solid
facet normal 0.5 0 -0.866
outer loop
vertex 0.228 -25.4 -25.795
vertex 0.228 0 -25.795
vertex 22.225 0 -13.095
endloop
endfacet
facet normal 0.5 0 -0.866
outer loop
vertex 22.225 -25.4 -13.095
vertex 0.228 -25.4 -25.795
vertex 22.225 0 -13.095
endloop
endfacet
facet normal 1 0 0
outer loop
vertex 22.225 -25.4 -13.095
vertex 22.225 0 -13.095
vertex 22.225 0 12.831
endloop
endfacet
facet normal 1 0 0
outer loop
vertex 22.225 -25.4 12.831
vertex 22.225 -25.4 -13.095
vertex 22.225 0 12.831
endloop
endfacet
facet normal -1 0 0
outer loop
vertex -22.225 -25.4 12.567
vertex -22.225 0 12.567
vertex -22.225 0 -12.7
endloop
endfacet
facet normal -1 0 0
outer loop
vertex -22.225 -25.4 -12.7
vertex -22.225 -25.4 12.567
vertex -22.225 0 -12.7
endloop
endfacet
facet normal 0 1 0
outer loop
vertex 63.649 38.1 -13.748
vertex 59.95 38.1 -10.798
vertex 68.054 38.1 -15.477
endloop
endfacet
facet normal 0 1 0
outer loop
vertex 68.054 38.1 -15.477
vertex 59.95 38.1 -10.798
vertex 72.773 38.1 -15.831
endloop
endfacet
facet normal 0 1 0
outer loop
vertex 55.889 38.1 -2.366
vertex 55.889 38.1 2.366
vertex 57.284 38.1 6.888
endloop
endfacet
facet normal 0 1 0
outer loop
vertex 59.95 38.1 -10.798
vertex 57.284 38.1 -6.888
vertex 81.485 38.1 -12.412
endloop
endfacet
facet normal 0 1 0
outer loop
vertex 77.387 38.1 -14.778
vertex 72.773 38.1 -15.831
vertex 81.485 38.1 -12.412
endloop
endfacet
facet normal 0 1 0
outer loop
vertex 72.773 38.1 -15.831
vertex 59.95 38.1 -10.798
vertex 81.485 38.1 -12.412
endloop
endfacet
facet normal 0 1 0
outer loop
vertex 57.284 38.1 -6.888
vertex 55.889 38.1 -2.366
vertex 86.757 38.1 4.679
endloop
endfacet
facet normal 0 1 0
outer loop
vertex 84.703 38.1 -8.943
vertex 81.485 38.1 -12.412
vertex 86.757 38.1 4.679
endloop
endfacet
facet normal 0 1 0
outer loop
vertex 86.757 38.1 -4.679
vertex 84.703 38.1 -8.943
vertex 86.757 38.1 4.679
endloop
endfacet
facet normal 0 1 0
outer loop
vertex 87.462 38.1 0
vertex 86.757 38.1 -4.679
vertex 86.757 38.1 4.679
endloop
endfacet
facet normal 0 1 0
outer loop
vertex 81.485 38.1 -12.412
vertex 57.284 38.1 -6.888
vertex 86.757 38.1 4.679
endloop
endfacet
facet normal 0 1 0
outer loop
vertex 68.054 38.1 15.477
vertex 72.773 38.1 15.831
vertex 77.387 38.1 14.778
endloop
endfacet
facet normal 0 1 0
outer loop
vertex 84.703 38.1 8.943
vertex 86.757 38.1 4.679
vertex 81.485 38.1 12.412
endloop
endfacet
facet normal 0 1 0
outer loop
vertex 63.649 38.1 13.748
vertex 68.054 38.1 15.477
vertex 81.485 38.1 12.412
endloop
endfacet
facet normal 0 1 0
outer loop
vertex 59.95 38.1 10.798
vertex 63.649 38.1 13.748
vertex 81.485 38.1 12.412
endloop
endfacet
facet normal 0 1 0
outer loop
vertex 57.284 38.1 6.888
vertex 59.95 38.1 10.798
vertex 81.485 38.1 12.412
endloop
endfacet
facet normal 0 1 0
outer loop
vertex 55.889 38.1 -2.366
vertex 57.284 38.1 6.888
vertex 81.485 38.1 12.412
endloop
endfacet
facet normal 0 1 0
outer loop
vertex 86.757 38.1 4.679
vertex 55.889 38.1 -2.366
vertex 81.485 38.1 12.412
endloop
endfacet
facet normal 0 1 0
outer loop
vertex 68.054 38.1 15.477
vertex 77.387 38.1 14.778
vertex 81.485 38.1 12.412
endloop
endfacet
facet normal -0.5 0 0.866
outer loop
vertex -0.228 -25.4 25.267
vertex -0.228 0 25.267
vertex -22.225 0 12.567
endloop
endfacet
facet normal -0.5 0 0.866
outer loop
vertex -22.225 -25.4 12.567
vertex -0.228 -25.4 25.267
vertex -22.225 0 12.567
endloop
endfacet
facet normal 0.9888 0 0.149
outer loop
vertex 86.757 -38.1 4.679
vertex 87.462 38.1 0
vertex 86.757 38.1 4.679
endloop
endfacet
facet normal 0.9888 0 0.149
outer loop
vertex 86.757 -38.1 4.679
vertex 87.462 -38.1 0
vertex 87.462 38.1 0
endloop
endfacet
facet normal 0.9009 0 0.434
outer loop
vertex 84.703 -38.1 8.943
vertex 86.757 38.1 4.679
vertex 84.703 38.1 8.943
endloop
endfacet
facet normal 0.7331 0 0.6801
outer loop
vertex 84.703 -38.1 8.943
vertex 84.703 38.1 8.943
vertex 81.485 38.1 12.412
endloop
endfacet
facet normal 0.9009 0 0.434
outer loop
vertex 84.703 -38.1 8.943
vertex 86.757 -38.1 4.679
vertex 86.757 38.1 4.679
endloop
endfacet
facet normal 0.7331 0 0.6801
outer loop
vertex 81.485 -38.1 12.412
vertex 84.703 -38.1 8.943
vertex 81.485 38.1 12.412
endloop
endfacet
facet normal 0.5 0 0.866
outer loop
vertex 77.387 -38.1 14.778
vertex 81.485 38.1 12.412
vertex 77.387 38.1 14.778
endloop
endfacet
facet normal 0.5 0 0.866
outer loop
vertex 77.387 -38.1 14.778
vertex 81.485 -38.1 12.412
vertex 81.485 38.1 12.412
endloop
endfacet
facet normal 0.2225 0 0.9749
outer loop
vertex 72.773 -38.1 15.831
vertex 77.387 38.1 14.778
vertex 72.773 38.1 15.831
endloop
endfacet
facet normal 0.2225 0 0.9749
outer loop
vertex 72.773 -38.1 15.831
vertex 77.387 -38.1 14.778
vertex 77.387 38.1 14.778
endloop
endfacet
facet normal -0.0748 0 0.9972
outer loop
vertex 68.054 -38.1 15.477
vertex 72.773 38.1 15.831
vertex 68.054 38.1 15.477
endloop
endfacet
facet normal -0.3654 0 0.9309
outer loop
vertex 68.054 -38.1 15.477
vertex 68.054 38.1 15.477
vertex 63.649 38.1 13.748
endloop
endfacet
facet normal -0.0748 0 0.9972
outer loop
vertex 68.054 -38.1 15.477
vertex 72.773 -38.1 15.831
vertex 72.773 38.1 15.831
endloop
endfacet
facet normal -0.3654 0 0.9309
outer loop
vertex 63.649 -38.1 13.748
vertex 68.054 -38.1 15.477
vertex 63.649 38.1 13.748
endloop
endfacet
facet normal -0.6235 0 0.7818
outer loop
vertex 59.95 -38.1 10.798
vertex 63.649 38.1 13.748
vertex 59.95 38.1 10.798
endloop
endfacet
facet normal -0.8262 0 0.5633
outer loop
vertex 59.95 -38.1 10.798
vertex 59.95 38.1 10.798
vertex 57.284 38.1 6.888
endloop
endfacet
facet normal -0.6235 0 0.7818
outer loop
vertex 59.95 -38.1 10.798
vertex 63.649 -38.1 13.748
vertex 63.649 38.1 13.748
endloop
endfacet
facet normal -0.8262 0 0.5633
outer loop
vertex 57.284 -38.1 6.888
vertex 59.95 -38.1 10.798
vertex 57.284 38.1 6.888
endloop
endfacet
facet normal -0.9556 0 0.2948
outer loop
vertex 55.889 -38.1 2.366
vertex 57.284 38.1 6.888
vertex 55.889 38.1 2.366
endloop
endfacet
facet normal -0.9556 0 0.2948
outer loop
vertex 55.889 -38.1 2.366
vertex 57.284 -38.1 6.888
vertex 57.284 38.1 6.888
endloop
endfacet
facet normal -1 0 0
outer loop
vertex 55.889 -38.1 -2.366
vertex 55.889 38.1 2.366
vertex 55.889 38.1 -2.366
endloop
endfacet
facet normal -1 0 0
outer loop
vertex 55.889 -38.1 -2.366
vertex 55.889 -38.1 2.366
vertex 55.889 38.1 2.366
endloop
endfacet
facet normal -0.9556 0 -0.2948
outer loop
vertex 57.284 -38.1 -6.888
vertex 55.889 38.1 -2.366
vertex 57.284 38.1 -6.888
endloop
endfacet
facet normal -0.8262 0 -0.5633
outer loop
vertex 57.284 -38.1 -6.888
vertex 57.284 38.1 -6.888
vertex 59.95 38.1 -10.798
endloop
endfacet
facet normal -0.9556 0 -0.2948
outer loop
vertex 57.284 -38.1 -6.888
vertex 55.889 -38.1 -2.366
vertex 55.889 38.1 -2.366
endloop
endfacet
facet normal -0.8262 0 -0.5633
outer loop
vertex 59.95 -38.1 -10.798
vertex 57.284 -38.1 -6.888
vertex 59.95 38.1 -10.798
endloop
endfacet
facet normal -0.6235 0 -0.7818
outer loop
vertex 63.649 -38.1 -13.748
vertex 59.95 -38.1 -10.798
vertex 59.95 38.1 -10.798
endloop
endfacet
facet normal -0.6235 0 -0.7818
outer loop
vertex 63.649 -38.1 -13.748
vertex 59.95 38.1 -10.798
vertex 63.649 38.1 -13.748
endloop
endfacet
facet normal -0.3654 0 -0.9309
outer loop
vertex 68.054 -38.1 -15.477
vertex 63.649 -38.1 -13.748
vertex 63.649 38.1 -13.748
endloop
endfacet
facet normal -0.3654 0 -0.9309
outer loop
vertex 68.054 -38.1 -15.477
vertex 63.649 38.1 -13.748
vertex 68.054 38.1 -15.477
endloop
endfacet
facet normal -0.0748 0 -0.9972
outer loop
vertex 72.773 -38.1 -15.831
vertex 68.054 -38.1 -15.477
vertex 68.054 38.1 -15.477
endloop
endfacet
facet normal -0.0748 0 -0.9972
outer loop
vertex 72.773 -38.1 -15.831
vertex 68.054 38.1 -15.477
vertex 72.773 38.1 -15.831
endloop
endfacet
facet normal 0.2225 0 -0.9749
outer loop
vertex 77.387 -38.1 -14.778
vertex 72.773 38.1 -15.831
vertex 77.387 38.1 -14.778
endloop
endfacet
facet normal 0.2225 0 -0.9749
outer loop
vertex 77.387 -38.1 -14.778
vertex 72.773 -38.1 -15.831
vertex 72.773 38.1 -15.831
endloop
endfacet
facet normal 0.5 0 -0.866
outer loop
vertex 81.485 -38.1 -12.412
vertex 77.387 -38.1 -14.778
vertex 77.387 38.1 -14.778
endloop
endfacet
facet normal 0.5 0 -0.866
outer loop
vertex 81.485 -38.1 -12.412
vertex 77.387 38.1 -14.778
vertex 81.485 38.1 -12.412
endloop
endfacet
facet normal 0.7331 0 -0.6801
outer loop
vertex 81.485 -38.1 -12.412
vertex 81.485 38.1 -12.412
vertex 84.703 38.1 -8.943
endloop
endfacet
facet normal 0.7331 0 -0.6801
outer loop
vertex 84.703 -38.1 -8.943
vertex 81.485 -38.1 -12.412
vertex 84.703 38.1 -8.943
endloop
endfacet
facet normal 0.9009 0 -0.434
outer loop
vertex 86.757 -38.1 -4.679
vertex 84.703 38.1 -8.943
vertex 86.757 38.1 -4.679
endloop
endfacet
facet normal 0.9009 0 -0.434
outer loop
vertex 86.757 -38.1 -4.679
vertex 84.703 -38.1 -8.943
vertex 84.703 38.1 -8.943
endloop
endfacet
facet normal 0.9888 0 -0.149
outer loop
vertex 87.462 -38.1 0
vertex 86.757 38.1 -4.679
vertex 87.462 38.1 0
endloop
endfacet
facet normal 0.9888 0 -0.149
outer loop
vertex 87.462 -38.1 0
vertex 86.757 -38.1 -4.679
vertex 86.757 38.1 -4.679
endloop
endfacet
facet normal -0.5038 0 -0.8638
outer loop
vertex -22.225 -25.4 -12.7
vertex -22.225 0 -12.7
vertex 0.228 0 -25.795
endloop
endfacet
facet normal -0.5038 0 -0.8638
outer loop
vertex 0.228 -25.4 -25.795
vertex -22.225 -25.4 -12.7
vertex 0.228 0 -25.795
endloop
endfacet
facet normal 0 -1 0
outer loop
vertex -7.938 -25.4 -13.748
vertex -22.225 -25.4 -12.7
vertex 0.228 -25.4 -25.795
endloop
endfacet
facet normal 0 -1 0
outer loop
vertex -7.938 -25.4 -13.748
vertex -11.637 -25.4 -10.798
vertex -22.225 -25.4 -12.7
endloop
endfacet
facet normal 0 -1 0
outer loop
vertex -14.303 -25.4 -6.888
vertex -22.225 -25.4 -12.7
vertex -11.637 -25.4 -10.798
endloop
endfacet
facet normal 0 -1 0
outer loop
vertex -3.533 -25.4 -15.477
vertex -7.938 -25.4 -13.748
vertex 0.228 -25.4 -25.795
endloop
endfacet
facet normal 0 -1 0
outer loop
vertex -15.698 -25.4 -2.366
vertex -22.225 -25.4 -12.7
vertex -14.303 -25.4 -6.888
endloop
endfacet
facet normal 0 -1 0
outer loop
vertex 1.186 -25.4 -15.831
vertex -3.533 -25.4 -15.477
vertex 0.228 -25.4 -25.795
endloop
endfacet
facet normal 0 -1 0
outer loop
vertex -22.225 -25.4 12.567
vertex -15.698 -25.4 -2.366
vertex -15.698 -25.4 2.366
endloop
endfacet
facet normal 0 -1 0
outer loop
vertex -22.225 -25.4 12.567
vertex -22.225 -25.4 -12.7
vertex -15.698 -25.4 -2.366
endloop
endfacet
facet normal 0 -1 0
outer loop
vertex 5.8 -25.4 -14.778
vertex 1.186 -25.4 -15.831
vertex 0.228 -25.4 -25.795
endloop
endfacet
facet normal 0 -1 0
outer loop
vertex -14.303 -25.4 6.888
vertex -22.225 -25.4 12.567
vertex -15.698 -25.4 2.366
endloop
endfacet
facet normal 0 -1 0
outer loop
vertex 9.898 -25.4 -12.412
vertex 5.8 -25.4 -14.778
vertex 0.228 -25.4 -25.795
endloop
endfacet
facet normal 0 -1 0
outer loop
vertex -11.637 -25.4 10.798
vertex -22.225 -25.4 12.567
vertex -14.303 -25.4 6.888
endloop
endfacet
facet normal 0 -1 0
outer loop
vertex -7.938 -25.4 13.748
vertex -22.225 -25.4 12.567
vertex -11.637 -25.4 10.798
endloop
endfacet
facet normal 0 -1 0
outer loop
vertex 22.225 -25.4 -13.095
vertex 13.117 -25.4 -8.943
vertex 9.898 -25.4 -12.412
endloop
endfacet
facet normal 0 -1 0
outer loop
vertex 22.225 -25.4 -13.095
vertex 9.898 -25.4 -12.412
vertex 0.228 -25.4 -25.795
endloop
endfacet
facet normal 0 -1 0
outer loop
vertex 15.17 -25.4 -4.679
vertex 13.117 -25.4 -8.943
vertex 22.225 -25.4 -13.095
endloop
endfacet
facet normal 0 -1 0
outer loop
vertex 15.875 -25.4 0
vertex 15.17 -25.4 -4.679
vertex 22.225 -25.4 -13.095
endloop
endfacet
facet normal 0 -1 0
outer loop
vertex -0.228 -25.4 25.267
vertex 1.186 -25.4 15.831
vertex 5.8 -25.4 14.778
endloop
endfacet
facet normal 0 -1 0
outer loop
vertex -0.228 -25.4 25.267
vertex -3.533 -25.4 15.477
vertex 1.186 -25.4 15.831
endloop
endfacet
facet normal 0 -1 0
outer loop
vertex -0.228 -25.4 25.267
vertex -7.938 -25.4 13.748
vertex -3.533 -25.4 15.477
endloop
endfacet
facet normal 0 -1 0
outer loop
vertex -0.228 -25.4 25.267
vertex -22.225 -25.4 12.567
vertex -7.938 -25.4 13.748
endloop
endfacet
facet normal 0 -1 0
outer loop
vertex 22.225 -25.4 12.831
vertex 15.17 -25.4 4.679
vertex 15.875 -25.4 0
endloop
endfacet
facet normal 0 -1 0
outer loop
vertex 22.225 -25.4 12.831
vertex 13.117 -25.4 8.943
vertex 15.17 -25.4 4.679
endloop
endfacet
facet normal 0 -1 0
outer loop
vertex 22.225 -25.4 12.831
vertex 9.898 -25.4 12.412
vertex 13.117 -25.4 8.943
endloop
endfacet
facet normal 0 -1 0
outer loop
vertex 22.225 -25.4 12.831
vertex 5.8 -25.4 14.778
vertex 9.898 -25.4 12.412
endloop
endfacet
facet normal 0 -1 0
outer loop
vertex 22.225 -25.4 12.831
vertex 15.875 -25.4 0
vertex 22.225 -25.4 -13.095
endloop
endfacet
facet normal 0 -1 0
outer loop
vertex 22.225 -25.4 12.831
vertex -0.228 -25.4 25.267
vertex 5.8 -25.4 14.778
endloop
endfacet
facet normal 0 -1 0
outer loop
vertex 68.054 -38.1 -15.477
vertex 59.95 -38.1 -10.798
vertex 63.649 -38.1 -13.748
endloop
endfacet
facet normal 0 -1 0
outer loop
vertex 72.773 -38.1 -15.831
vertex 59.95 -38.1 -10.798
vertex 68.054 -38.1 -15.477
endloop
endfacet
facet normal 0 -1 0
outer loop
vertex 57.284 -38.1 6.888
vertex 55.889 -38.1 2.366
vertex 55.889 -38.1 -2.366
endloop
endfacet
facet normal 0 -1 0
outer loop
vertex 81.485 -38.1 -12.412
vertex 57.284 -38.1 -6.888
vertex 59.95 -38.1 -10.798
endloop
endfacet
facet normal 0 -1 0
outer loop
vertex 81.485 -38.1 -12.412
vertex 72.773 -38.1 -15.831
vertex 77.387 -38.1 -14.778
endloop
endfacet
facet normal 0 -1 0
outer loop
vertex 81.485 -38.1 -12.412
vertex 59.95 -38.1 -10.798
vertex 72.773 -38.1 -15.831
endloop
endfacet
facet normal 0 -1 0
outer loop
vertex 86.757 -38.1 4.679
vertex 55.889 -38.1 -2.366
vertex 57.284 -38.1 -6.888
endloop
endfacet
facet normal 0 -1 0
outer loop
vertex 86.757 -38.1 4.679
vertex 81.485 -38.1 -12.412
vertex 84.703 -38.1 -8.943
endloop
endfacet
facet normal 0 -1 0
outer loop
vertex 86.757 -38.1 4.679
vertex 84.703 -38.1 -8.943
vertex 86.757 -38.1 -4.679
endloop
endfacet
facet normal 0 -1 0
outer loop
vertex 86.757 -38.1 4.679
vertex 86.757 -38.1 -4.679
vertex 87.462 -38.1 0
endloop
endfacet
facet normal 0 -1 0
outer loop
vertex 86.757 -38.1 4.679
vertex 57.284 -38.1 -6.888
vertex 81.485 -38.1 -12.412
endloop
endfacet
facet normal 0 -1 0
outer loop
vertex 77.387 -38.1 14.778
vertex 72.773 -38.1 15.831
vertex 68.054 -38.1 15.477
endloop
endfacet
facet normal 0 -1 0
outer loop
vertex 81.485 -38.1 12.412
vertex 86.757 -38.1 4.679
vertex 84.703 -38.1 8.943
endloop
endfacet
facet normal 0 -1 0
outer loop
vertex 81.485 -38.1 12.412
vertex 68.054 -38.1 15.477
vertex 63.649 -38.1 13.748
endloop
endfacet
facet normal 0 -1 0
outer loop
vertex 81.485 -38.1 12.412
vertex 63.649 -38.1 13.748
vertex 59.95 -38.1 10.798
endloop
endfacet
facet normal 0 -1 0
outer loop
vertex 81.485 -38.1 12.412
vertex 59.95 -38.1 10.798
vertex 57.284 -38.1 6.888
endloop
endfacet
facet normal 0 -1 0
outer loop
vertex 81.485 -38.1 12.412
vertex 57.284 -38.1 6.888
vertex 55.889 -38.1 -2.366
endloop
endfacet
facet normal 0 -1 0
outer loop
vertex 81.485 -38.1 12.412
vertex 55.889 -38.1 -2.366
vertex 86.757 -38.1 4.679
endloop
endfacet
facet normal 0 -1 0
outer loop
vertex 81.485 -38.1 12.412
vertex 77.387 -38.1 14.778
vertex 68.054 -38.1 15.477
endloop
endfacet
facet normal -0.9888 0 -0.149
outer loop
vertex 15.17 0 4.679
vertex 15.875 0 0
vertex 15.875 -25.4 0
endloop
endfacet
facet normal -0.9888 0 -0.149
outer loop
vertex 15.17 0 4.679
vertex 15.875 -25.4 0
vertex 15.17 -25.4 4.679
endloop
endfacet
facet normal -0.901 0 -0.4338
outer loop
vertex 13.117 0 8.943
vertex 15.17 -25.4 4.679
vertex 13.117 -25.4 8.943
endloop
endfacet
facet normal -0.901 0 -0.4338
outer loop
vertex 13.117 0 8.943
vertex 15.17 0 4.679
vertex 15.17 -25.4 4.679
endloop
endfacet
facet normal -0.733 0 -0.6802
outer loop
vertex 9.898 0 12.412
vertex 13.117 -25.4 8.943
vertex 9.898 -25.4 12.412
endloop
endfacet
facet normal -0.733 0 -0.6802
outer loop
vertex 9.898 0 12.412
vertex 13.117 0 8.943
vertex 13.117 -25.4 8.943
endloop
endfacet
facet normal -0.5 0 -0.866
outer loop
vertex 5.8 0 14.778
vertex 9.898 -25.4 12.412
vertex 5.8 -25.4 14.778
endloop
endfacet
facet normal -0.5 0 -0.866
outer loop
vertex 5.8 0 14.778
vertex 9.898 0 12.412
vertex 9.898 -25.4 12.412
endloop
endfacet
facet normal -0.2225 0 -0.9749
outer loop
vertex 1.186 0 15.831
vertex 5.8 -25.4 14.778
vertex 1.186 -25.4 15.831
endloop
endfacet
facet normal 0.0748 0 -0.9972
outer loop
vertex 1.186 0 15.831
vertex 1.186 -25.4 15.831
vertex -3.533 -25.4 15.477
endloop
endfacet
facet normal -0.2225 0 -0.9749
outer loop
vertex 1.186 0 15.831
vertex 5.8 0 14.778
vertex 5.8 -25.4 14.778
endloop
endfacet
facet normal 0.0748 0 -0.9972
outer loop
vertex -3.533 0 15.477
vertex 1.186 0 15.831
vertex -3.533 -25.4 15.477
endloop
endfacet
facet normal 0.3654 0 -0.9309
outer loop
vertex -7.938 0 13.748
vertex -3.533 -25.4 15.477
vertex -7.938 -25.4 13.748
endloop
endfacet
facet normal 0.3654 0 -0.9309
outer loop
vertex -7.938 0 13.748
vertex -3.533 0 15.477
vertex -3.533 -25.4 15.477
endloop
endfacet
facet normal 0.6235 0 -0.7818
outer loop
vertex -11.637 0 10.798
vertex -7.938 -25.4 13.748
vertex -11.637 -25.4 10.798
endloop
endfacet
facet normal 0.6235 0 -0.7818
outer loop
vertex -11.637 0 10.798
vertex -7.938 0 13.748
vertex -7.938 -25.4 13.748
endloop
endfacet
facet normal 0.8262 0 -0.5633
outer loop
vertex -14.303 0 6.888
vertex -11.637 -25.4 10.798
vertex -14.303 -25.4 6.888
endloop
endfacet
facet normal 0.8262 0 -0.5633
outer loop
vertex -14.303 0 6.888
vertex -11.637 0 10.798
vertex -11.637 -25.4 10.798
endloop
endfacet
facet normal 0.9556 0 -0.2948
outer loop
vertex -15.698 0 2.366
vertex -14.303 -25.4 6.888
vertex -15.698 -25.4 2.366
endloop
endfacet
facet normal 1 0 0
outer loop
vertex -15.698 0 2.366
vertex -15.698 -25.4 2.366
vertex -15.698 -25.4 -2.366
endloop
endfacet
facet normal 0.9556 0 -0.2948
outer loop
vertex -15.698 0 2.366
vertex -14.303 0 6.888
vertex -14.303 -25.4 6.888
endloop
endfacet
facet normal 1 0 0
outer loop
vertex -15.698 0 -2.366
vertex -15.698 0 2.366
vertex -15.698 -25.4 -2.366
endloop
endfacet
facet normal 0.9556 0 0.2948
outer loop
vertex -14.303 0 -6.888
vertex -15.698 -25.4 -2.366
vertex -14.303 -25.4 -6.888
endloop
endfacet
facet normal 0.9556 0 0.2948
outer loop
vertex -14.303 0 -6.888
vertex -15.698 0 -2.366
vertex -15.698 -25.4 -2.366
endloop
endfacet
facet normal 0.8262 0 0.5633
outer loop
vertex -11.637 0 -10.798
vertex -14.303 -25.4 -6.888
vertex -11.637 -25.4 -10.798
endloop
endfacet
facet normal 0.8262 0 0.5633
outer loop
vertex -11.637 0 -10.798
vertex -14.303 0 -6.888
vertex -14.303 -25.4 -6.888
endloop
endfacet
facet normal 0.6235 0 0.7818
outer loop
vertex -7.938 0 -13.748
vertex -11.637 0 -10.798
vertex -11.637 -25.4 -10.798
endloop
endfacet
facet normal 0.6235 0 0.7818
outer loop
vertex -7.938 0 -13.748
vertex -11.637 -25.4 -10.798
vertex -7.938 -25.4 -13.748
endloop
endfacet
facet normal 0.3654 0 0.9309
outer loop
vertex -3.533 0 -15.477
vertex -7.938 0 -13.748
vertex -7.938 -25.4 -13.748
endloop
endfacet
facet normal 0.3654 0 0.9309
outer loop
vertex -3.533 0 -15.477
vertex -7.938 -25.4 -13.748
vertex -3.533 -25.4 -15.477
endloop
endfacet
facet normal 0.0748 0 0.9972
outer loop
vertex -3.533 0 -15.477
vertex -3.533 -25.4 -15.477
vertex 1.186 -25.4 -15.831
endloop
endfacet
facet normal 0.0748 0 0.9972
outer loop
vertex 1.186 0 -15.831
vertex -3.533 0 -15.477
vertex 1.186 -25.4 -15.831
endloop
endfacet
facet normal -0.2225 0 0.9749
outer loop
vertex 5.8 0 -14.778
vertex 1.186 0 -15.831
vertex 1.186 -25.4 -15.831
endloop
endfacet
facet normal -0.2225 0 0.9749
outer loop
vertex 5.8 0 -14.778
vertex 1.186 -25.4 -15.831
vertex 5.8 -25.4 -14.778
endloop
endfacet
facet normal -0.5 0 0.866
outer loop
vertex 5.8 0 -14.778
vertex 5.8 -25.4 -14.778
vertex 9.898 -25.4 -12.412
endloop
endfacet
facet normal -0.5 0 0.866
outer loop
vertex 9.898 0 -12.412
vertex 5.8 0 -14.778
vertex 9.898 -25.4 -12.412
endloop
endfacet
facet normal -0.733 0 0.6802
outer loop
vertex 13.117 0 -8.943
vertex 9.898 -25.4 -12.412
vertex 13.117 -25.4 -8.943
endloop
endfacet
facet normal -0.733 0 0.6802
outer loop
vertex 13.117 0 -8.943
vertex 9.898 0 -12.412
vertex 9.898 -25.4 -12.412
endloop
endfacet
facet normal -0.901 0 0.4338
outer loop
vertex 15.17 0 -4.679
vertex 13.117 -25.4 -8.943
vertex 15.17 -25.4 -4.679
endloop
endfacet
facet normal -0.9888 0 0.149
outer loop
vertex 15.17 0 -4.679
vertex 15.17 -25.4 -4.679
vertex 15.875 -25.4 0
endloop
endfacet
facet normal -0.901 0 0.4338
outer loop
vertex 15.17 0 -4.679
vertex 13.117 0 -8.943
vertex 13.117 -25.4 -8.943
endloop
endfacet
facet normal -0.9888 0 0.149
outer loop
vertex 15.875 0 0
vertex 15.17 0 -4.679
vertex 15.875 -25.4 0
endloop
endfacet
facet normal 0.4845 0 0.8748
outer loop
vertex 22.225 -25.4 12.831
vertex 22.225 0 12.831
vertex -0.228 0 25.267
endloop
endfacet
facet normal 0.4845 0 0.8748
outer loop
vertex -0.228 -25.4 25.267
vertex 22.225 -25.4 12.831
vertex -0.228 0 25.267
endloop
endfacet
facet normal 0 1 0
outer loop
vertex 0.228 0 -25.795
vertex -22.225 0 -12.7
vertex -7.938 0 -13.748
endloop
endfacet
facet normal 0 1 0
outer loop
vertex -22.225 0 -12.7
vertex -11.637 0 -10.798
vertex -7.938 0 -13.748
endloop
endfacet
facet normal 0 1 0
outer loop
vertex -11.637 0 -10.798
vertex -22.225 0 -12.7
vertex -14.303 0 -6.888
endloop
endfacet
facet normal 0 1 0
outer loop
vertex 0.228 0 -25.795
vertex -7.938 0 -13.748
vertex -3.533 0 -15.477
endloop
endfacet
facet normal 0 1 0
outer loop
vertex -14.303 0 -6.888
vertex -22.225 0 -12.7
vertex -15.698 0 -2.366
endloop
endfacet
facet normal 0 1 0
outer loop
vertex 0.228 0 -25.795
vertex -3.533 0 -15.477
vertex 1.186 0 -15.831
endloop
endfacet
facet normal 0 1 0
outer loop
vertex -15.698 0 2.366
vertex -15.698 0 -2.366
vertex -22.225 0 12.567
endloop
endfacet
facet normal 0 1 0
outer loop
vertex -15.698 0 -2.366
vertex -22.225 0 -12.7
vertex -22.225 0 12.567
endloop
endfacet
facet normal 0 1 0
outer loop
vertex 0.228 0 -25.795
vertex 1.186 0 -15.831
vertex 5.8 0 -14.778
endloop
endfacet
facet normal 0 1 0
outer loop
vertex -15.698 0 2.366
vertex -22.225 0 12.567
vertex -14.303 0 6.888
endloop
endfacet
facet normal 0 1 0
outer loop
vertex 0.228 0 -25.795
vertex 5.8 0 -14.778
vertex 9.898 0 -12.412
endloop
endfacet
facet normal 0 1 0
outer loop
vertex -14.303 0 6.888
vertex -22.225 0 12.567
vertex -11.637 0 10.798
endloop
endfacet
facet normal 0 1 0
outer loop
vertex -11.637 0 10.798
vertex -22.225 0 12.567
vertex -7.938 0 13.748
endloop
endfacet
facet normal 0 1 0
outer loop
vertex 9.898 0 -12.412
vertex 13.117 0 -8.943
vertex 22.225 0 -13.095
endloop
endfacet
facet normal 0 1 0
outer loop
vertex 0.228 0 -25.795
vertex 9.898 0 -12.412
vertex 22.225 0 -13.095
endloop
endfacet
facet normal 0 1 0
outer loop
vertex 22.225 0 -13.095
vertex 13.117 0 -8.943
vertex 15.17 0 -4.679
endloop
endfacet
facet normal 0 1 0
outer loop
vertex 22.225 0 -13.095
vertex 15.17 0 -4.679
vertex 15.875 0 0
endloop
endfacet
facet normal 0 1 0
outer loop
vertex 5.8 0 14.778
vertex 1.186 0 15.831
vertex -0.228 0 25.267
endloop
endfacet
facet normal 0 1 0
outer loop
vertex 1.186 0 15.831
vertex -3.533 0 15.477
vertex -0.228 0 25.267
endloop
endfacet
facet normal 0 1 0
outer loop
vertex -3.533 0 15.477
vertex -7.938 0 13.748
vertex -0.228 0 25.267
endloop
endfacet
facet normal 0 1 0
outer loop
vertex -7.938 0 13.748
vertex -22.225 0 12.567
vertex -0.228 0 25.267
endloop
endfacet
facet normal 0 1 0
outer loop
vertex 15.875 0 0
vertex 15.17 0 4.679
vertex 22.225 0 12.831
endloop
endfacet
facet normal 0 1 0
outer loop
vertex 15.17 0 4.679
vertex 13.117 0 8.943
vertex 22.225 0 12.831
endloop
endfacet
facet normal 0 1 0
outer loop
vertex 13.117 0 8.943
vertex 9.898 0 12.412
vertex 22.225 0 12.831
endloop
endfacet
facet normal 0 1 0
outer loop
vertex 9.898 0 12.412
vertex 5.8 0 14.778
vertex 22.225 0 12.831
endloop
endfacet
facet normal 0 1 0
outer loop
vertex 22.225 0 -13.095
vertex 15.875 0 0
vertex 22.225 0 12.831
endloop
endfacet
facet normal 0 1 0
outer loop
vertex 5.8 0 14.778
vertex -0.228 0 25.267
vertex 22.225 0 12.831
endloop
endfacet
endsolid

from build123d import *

# Parameters (mm, degrees)
F0_R     = 15.875
F1_DEPTH = 25.4
F2_DEPTH = 38.1


with BuildPart() as f1:
    # F0 (on Front) → F1 (new body)
    with BuildSketch(Plane.XZ):
        Polygon((-0.227955, 25.267487), (-22.225, 12.567487), (-22.225, -12.7), (0.227955, -25.794829), (22.225, -13.094829), (22.225, 12.830713), align=None)
        Circle(F0_R, mode=Mode.SUBTRACT)
    extrude(amount=F1_DEPTH)


with BuildPart() as f2:
    # F0 (on Front) → F2 (new body, symmetric)
    with BuildSketch(Plane.XZ):
        with Locations((71.586899, 0)):
            Circle(F0_R)
    extrude(amount=F2_DEPTH, both=True)


solid = Compound([f1.part, f2.part])
